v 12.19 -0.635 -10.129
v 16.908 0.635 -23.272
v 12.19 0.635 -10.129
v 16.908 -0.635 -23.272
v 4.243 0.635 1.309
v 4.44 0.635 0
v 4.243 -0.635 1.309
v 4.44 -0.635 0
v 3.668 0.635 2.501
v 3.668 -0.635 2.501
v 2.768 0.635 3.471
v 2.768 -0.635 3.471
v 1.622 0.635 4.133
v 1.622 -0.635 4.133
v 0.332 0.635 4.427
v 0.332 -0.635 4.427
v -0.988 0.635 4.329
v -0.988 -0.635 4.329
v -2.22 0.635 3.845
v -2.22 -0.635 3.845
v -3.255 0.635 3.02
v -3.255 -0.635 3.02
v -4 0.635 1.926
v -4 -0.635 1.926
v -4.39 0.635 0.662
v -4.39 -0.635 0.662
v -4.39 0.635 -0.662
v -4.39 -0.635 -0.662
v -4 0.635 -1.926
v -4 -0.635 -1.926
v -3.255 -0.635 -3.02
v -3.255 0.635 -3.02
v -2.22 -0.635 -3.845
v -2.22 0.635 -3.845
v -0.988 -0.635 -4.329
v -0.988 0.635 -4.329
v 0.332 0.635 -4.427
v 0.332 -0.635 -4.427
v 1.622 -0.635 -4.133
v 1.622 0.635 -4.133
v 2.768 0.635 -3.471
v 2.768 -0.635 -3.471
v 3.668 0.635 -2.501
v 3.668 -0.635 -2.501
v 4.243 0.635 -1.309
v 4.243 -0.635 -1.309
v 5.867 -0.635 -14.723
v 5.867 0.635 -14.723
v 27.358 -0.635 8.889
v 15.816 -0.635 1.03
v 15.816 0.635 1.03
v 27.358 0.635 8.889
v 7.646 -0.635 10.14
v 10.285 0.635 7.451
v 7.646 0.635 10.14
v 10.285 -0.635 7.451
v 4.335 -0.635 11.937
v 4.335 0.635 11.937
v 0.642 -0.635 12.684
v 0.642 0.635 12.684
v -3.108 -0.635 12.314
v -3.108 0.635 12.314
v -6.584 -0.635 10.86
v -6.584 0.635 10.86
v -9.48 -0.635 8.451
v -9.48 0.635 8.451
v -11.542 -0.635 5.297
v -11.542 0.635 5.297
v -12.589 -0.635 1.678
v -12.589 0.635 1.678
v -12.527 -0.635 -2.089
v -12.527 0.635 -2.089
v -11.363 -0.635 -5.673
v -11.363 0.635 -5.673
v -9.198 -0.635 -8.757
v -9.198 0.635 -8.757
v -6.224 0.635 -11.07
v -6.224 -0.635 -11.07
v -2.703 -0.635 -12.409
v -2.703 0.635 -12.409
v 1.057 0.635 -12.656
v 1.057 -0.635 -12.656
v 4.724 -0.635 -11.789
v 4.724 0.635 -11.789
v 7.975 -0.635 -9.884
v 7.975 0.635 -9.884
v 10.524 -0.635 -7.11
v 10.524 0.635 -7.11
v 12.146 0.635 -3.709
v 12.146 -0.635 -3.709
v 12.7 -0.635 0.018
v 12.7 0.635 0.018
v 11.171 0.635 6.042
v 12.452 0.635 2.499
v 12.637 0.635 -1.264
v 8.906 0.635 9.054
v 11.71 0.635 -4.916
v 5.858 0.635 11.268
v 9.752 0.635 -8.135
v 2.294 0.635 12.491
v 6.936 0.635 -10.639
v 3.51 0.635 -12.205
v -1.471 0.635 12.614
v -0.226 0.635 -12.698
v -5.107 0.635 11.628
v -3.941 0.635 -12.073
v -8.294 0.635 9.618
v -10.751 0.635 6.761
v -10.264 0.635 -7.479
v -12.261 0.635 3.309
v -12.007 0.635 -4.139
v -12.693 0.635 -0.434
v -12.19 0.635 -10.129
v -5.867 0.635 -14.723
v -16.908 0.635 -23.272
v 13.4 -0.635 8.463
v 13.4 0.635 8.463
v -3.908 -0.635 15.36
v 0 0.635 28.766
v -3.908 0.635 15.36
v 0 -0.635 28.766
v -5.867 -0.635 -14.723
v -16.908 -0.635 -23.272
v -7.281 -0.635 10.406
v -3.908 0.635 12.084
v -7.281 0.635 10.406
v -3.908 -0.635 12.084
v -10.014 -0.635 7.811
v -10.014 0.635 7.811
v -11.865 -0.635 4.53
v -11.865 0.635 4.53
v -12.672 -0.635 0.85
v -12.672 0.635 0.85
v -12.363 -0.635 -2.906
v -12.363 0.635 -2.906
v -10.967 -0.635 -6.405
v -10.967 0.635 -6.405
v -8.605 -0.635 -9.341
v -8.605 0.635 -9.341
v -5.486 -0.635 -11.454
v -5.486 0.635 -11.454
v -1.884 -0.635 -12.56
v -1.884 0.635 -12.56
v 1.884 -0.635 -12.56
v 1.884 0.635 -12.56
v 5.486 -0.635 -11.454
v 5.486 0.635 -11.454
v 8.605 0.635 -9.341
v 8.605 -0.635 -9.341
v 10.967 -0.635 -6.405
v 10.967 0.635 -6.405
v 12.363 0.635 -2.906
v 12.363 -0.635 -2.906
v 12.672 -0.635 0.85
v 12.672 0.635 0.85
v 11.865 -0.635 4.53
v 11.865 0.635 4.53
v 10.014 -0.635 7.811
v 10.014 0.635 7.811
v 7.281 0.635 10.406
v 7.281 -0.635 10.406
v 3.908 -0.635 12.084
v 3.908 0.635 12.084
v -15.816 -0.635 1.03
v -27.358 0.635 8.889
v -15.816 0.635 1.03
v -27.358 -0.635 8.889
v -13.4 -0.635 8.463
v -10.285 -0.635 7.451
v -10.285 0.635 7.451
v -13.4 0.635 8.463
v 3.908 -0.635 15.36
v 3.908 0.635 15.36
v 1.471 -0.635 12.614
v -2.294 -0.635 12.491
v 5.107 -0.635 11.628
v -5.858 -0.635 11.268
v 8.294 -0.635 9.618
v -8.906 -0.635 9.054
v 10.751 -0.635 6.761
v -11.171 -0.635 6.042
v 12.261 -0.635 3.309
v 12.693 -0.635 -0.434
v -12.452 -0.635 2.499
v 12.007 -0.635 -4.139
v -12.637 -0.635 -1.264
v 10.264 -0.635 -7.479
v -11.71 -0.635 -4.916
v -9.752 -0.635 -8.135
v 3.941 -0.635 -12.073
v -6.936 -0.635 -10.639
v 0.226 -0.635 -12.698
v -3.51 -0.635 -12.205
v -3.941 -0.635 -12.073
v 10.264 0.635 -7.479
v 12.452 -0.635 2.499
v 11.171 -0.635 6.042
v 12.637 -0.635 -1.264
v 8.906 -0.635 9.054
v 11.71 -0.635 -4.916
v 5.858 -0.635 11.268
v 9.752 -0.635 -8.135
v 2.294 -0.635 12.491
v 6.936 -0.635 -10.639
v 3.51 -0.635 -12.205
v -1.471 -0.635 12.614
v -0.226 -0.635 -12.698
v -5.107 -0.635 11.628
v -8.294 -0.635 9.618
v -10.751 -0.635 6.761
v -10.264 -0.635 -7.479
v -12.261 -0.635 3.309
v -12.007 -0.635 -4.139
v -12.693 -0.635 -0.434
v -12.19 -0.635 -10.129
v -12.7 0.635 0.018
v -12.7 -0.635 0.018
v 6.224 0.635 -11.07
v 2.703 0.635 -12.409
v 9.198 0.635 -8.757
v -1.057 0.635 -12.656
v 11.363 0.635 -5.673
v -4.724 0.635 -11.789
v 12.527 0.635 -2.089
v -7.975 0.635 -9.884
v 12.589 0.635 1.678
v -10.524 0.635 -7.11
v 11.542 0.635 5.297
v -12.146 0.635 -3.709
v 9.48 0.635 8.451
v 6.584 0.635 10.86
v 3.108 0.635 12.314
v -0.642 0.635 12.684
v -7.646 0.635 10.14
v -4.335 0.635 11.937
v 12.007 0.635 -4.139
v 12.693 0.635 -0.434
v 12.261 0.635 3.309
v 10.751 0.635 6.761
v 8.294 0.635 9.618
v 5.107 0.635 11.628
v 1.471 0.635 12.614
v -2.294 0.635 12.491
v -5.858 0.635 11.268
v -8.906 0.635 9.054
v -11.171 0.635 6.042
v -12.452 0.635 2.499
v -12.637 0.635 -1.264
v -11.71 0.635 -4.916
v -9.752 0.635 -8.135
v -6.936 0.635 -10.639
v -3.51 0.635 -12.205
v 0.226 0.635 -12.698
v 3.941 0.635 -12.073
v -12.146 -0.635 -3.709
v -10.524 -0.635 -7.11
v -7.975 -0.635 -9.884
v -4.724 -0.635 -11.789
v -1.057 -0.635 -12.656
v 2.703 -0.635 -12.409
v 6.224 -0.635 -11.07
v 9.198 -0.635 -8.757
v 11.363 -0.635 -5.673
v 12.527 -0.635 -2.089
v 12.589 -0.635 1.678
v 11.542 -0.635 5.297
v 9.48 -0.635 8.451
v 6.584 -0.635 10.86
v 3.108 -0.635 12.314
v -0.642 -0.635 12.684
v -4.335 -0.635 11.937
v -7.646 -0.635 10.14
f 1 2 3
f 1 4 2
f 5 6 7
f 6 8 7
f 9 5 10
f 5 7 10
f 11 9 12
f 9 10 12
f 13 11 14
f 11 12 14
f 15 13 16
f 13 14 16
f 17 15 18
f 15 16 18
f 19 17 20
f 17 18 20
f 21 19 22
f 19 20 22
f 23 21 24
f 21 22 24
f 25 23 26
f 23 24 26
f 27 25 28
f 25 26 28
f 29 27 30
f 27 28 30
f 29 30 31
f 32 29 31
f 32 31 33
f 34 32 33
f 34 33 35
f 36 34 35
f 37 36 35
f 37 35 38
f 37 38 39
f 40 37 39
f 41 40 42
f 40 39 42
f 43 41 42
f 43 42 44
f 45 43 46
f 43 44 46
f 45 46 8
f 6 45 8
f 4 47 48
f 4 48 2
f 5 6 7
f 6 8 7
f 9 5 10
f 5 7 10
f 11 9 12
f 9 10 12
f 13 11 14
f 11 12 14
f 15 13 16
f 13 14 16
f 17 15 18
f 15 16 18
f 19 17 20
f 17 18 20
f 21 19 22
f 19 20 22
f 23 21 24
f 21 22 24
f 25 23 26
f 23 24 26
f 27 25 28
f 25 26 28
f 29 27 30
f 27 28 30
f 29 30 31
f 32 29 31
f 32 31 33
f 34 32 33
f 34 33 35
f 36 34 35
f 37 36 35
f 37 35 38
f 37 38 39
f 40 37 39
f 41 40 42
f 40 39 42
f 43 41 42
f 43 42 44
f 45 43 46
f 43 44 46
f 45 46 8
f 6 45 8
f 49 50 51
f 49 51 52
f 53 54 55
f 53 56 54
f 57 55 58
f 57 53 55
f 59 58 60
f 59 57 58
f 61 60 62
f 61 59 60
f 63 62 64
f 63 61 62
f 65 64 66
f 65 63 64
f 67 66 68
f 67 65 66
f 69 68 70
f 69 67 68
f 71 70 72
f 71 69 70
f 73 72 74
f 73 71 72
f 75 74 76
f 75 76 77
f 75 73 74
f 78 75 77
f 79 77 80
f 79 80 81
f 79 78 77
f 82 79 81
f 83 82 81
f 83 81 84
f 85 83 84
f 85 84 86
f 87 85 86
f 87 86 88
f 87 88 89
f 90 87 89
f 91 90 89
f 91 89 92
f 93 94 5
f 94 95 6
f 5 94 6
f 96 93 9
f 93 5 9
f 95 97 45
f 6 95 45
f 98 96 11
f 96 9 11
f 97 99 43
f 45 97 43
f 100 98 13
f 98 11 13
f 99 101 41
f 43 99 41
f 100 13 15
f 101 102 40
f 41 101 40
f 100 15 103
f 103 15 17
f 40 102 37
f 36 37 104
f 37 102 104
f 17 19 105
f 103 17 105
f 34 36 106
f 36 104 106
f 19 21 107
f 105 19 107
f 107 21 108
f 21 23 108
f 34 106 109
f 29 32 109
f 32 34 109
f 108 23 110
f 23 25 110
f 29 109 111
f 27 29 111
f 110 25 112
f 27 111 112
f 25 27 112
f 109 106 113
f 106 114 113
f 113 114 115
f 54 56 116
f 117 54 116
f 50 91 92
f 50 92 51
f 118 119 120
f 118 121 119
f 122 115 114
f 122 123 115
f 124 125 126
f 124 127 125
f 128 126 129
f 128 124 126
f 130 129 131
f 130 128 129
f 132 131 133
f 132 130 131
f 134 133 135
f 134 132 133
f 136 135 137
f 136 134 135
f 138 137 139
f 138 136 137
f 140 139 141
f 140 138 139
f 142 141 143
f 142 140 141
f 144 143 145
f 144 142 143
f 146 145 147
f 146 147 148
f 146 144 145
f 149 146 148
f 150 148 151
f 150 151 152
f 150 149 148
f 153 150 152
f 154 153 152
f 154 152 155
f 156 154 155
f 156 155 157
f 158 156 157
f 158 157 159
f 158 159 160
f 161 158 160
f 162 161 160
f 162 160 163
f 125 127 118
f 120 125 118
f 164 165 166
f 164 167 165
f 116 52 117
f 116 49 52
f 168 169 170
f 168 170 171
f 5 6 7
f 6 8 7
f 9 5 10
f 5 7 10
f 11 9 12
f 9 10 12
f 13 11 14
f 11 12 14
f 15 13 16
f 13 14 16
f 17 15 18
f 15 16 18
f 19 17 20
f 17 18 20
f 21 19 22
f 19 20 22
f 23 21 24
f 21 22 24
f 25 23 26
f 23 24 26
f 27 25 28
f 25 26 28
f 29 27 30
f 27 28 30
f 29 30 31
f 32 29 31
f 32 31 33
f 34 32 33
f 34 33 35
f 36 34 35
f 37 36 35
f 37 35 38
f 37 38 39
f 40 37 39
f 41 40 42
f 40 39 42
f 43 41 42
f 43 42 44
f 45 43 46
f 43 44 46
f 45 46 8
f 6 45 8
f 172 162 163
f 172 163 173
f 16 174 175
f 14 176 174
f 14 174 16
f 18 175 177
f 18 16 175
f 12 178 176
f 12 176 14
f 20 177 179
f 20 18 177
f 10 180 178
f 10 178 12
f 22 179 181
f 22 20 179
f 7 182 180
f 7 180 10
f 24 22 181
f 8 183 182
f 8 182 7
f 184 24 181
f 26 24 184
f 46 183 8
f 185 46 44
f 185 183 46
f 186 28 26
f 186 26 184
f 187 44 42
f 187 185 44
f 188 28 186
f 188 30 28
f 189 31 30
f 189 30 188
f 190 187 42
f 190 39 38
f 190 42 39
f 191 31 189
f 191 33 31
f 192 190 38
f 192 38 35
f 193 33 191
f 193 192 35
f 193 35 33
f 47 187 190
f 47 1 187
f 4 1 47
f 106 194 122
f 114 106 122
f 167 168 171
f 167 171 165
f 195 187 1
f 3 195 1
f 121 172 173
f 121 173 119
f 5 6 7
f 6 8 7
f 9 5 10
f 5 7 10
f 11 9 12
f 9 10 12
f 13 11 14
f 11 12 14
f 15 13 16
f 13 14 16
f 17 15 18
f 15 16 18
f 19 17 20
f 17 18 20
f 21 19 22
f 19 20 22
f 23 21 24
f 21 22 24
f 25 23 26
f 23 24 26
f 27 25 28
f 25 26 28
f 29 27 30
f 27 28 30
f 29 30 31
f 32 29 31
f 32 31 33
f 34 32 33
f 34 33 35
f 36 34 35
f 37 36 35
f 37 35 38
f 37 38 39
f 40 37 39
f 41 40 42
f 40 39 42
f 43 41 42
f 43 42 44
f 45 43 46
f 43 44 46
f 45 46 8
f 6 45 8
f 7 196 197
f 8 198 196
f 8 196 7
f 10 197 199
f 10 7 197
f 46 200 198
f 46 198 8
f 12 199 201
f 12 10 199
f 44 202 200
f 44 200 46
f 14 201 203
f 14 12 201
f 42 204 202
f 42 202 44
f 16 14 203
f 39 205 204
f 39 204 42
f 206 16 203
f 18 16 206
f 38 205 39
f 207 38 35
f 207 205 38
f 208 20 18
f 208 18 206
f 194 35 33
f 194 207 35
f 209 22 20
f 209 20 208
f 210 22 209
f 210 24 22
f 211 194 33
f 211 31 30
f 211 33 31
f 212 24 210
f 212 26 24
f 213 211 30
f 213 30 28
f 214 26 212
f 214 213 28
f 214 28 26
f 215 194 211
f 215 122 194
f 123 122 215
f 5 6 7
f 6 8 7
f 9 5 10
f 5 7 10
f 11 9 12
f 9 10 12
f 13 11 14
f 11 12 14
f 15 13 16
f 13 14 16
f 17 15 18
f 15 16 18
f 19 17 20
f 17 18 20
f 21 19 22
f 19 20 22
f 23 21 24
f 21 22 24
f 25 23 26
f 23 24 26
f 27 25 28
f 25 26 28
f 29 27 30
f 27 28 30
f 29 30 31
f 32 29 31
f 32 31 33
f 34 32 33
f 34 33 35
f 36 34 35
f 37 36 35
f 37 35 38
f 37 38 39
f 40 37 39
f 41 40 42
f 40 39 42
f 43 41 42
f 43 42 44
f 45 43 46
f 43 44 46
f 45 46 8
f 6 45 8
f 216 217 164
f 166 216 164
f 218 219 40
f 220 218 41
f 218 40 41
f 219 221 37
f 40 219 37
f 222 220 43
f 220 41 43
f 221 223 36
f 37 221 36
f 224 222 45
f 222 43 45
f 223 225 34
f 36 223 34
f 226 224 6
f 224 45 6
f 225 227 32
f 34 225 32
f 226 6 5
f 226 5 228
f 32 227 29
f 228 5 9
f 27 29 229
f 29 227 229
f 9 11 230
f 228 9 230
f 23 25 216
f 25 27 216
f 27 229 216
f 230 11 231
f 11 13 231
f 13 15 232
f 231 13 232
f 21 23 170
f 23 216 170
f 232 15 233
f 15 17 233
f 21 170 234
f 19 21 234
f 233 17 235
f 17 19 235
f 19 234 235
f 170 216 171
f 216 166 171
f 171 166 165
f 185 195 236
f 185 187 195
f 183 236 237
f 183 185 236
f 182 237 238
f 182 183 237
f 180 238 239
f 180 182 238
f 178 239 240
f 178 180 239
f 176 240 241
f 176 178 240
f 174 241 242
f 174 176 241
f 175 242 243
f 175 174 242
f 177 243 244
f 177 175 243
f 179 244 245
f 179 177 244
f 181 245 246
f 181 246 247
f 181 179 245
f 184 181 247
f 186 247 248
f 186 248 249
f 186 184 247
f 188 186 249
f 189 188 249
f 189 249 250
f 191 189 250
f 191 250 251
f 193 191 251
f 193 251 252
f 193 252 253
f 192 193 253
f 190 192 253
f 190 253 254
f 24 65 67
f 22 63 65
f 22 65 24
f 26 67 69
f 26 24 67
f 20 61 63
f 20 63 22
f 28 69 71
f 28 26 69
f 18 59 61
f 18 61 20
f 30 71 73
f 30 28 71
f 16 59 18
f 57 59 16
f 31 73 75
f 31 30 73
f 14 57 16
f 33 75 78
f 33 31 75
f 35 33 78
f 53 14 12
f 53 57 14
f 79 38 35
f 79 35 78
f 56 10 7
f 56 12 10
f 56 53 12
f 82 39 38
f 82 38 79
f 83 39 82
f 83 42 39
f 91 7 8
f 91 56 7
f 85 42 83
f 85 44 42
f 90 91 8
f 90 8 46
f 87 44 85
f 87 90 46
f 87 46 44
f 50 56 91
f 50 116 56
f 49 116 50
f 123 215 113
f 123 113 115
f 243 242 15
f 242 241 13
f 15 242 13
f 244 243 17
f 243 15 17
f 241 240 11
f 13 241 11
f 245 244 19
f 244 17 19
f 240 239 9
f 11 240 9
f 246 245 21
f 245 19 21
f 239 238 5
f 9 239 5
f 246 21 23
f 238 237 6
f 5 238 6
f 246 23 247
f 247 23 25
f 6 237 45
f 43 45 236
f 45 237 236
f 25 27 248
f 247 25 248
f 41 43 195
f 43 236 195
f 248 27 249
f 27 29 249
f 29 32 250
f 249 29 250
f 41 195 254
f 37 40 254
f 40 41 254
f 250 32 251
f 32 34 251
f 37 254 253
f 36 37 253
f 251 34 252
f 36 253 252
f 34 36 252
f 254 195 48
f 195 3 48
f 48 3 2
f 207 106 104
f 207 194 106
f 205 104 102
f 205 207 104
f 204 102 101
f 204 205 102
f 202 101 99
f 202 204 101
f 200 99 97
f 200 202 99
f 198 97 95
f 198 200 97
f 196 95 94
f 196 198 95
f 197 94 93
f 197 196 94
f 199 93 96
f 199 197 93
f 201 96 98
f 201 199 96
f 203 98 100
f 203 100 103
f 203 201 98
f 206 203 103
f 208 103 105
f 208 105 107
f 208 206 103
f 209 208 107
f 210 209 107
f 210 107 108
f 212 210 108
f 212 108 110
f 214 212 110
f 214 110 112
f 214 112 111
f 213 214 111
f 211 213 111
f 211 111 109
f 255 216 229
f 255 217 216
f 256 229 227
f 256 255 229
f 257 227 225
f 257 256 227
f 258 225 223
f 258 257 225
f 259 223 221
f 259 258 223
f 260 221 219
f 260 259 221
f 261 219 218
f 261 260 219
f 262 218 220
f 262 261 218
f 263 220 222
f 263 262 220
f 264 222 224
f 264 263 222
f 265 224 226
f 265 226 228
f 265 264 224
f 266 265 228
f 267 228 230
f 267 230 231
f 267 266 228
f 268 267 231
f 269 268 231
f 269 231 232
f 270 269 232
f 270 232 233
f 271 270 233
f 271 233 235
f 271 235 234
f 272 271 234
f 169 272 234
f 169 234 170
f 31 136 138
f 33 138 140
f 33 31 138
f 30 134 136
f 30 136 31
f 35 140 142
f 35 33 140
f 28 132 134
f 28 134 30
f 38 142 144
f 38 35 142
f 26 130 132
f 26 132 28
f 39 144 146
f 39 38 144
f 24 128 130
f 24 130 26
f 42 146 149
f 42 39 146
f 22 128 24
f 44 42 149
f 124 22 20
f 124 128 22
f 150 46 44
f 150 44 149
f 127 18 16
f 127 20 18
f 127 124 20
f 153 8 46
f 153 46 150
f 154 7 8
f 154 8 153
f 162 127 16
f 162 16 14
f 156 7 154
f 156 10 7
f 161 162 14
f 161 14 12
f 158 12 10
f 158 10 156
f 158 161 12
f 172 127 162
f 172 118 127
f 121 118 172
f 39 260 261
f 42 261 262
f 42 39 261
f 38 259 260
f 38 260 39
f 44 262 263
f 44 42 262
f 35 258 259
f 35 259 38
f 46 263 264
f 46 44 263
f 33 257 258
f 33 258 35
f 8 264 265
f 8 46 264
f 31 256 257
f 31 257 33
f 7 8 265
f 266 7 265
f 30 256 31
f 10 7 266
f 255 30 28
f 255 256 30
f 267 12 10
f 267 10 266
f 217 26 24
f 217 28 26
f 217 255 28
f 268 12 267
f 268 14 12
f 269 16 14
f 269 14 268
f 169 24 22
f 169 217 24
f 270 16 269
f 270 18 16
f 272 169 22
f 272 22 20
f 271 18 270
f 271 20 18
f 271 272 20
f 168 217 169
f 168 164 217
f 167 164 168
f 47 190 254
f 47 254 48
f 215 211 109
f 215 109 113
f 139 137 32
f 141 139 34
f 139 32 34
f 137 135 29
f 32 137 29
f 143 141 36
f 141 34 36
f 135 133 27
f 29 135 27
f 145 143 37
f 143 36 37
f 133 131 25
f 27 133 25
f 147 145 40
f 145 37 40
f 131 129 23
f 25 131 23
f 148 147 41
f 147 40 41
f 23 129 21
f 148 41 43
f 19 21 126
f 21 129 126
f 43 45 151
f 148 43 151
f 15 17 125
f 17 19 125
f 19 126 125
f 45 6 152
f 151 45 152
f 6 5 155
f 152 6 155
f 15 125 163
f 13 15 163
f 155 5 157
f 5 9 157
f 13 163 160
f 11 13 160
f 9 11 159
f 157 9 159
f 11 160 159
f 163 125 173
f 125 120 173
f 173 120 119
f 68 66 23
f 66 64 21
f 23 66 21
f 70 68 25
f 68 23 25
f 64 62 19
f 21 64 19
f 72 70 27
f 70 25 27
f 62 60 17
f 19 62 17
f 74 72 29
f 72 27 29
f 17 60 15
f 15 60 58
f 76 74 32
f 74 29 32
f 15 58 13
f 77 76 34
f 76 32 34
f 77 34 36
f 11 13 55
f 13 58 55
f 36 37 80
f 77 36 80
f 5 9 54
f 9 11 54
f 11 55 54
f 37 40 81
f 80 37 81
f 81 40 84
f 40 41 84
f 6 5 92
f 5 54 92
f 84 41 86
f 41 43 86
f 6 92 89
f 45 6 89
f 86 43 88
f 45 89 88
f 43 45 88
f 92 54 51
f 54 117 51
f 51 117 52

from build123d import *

# Parameters (mm, degrees)
F0_R     = 12.7
F1_DEPTH = 0.635
F2_W     = 7.815492
F2_H     = 5.961056
F3_DEPTH = 0.635
F4_COUNT = 5
F5_R     = 4.439905
F6_DEPTH = 0.635


with BuildPart() as f1:
    # F0 (on Front) → F1 (new body, symmetric)
    with BuildSketch(Plane.XZ):
        Circle(F0_R)
    extrude(amount=F1_DEPTH, both=True)

    # F2 (on Front) → F3 (join, symmetric)
    with BuildSketch(Plane.XZ):
        with Locations((0, 12.379177)):
            Rectangle(F2_W, F2_H)
        Polygon((-3.907746, 15.359705), (3.907746, 15.359705), (0, 28.765569), align=None)
    extrude(amount=F3_DEPTH, both=True)


with BuildPart() as f4_1:
    # F4: instance of F1
    add(f1.part.rotate(Axis((0, -0.635, 0), (0, 1, 0)), 1 * 360 / F4_COUNT))


with BuildPart() as f4_2:
    # F4: instance of F1
    add(f1.part.rotate(Axis((0, -0.635, 0), (0, 1, 0)), 2 * 360 / F4_COUNT))


with BuildPart() as f4_3:
    # F4: instance of F1
    add(f1.part.rotate(Axis((0, -0.635, 0), (0, 1, 0)), 3 * 360 / F4_COUNT))


with BuildPart() as f4_4:
    # F4: instance of F1
    add(f1.part.rotate(Axis((0, -0.635, 0), (0, 1, 0)), 4 * 360 / F4_COUNT))


with BuildPart() as f6_tool:
    # F5 (on Front) → F6 (new body, symmetric)
    with BuildSketch(Plane.XZ):
        Circle(F5_R)
    extrude(amount=F6_DEPTH, both=True)


with BuildPart() as f1_1:
    add(f1.part)

    # F6: cut by f6_tool
    add(f6_tool.part, mode=Mode.SUBTRACT)


with BuildPart() as f4_1_1:
    add(f4_1.part)

    # F6: cut by f6_tool
    add(f6_tool.part, mode=Mode.SUBTRACT)


with BuildPart() as f4_2_1:
    add(f4_2.part)

    # F6: cut by f6_tool
    add(f6_tool.part, mode=Mode.SUBTRACT)


with BuildPart() as f4_3_1:
    add(f4_3.part)

    # F6: cut by f6_tool
    add(f6_tool.part, mode=Mode.SUBTRACT)


with BuildPart() as f4_4_1:
    add(f4_4.part)

    # F6: cut by f6_tool
    add(f6_tool.part, mode=Mode.SUBTRACT)


solid = Compound([f1_1.part, f4_1_1.part, f4_2_1.part, f4_3_1.part, f4_4_1.part])
